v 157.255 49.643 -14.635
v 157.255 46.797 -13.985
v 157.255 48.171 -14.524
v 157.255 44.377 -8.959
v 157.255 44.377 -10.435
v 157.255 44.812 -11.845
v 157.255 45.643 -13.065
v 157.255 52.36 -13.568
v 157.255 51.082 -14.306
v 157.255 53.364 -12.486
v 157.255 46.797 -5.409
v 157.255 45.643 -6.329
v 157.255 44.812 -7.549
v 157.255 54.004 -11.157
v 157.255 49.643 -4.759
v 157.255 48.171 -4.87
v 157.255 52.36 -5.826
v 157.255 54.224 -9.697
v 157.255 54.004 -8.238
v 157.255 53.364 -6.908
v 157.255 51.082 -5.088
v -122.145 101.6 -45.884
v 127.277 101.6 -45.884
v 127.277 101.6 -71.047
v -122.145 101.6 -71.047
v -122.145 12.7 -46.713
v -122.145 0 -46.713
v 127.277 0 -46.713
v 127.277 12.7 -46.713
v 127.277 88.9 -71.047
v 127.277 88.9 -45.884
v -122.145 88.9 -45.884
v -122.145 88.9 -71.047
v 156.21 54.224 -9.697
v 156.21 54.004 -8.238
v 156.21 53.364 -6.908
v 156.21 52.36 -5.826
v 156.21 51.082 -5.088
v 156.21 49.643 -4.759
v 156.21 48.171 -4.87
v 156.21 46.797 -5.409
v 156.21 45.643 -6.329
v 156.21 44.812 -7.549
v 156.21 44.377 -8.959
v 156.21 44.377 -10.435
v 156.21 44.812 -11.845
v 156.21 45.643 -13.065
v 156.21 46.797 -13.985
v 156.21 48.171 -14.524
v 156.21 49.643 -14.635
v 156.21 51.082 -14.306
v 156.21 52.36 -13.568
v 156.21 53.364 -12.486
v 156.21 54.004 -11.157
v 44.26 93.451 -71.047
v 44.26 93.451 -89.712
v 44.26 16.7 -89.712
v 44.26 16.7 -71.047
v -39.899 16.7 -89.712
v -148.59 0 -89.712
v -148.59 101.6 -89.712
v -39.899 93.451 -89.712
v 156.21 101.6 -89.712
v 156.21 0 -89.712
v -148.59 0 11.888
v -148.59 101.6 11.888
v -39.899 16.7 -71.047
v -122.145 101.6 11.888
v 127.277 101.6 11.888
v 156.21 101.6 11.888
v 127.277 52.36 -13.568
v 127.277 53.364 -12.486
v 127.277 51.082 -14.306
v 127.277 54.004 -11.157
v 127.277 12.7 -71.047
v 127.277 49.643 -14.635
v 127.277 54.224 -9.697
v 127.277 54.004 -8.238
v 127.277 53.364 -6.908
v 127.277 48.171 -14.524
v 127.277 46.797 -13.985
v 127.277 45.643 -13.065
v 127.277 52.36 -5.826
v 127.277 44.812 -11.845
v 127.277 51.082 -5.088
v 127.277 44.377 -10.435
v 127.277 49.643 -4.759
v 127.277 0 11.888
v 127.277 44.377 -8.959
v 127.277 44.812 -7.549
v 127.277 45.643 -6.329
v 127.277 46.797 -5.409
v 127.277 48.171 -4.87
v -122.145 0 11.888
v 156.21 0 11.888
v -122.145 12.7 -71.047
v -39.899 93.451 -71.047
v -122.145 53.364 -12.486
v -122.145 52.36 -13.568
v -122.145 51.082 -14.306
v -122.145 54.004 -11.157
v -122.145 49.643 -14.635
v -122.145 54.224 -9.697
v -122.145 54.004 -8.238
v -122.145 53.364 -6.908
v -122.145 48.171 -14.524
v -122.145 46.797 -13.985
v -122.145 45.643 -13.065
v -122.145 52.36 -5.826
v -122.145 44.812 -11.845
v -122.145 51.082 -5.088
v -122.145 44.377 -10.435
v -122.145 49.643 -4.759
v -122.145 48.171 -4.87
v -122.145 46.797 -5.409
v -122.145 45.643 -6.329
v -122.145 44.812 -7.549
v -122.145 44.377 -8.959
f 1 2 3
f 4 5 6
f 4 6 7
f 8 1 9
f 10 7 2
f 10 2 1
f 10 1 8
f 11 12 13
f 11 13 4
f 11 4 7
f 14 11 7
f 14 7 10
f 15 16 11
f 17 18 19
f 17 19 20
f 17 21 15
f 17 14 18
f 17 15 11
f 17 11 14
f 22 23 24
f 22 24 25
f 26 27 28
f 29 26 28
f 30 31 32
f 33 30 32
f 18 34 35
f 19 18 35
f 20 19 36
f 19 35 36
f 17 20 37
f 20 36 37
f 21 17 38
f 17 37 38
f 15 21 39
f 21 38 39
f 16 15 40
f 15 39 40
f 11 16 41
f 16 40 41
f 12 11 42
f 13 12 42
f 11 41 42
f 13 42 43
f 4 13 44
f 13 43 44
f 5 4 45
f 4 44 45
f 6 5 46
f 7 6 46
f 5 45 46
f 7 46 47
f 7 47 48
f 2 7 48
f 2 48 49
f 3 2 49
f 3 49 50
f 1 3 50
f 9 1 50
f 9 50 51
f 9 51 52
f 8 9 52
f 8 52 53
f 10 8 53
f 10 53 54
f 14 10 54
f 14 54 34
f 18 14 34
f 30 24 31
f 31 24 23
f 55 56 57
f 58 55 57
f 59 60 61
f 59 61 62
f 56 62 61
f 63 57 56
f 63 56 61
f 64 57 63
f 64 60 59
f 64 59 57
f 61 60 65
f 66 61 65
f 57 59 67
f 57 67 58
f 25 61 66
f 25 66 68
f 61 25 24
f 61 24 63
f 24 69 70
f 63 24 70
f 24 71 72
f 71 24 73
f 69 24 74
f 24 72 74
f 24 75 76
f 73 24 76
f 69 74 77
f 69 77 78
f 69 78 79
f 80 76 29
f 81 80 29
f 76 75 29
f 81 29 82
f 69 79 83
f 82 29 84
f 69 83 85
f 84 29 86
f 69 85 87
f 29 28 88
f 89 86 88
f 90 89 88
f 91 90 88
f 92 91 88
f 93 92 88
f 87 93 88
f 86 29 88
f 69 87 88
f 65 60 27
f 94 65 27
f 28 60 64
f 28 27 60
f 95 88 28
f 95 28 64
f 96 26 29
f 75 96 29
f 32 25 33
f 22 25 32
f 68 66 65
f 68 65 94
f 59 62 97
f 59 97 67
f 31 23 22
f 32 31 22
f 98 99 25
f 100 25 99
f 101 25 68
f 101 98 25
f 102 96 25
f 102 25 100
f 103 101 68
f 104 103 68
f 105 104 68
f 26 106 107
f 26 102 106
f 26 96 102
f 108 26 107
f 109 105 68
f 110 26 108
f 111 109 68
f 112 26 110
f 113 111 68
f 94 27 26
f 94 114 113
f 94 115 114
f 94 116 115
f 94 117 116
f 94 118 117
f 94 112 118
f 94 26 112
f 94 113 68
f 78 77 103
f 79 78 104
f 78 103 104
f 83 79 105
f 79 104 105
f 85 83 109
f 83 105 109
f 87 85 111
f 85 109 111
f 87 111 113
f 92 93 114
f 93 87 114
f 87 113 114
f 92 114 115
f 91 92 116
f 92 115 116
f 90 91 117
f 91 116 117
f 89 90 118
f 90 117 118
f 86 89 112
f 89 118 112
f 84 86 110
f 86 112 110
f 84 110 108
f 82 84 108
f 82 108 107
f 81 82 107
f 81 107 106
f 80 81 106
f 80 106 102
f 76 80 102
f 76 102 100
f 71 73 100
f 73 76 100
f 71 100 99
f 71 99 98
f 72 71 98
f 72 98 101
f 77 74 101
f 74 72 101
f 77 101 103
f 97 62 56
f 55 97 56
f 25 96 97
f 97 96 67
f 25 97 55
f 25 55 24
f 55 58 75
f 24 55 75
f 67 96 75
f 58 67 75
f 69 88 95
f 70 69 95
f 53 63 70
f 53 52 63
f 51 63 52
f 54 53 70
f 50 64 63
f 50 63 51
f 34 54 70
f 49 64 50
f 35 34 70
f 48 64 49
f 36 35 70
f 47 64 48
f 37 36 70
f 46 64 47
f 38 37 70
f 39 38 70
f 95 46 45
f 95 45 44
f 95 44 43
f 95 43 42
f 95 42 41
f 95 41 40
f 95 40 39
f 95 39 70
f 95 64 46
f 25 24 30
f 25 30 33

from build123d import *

# Parameters (mm, degrees)
F0_W      = 304.8
F0_H      = 101.6
F1_DEPTH  = 101.6
F2_W      = 249.4217529893
F2_H      = 82.9348426428
F3_DEPTH  = 101.6
F4_W      = 84.1586701572
F4_H      = 76.750330627
F5_DEPTH  = 25.4
F6_W      = 249.4217529893
F6_H      = 24.3338234723
F7_DEPTH  = 12.7
F8_W      = 249.4217529893
F8_H      = 25.1633860171
F9_DEPTH  = 12.7
F10_R     = 4.9515094563
F11_DEPTH = 279.4


with BuildPart() as f1:
    # F0 (on Front) → F1 (new body)
    with BuildSketch(Plane.XZ):
        with Locations((3.8099996746, -38.9124708686)):
            Rectangle(F0_W, F0_H)
    extrude(amount=-F1_DEPTH)

    # F2 (on face) → F3 (cut)
    with BuildSketch(Plane.XZ):
        with Locations((2.5656633079, -29.57989219)):
            Rectangle(F2_W, F2_H)
    extrude(amount=-F3_DEPTH, mode=Mode.SUBTRACT)

    # F4 (on face) → F5 (cut)
    with BuildSketch(Plane(origin=(0, 0, -89.7124708686), x_dir=(1, 0, 0), z_dir=(0, 0, -1))):
        with Locations((2.1801721305, -55.0756640732)):
            Rectangle(F4_W, F4_H)
    extrude(amount=-F5_DEPTH, mode=Mode.SUBTRACT)

    # F6 (on face) → F7 (join)
    with BuildSketch(Plane.XZ):
        with Locations((2.5656633079, -58.8804017752)):
            Rectangle(F6_W, F6_H)
    extrude(amount=-F7_DEPTH)

    # F10 (on face) → F11 (join)
    with BuildSketch(Plane.YZ.offset(-122.1452131867)):
        with Locations((49.2728576064, -9.6970386803)):
            Circle(F10_R)
    extrude(amount=F11_DEPTH)


with BuildPart() as f9:
    # F8 (on face) → F9 (new body)
    with BuildSketch(Plane(origin=(0, 101.6, 0), x_dir=(-1, 0, 0), z_dir=(0, 1, 0))):
        with Locations((-2.5656633079, -58.4656205028)):
            Rectangle(F8_W, F8_H)
    extrude(amount=-F9_DEPTH)


solid = Compound([f1.part, f9.part])
